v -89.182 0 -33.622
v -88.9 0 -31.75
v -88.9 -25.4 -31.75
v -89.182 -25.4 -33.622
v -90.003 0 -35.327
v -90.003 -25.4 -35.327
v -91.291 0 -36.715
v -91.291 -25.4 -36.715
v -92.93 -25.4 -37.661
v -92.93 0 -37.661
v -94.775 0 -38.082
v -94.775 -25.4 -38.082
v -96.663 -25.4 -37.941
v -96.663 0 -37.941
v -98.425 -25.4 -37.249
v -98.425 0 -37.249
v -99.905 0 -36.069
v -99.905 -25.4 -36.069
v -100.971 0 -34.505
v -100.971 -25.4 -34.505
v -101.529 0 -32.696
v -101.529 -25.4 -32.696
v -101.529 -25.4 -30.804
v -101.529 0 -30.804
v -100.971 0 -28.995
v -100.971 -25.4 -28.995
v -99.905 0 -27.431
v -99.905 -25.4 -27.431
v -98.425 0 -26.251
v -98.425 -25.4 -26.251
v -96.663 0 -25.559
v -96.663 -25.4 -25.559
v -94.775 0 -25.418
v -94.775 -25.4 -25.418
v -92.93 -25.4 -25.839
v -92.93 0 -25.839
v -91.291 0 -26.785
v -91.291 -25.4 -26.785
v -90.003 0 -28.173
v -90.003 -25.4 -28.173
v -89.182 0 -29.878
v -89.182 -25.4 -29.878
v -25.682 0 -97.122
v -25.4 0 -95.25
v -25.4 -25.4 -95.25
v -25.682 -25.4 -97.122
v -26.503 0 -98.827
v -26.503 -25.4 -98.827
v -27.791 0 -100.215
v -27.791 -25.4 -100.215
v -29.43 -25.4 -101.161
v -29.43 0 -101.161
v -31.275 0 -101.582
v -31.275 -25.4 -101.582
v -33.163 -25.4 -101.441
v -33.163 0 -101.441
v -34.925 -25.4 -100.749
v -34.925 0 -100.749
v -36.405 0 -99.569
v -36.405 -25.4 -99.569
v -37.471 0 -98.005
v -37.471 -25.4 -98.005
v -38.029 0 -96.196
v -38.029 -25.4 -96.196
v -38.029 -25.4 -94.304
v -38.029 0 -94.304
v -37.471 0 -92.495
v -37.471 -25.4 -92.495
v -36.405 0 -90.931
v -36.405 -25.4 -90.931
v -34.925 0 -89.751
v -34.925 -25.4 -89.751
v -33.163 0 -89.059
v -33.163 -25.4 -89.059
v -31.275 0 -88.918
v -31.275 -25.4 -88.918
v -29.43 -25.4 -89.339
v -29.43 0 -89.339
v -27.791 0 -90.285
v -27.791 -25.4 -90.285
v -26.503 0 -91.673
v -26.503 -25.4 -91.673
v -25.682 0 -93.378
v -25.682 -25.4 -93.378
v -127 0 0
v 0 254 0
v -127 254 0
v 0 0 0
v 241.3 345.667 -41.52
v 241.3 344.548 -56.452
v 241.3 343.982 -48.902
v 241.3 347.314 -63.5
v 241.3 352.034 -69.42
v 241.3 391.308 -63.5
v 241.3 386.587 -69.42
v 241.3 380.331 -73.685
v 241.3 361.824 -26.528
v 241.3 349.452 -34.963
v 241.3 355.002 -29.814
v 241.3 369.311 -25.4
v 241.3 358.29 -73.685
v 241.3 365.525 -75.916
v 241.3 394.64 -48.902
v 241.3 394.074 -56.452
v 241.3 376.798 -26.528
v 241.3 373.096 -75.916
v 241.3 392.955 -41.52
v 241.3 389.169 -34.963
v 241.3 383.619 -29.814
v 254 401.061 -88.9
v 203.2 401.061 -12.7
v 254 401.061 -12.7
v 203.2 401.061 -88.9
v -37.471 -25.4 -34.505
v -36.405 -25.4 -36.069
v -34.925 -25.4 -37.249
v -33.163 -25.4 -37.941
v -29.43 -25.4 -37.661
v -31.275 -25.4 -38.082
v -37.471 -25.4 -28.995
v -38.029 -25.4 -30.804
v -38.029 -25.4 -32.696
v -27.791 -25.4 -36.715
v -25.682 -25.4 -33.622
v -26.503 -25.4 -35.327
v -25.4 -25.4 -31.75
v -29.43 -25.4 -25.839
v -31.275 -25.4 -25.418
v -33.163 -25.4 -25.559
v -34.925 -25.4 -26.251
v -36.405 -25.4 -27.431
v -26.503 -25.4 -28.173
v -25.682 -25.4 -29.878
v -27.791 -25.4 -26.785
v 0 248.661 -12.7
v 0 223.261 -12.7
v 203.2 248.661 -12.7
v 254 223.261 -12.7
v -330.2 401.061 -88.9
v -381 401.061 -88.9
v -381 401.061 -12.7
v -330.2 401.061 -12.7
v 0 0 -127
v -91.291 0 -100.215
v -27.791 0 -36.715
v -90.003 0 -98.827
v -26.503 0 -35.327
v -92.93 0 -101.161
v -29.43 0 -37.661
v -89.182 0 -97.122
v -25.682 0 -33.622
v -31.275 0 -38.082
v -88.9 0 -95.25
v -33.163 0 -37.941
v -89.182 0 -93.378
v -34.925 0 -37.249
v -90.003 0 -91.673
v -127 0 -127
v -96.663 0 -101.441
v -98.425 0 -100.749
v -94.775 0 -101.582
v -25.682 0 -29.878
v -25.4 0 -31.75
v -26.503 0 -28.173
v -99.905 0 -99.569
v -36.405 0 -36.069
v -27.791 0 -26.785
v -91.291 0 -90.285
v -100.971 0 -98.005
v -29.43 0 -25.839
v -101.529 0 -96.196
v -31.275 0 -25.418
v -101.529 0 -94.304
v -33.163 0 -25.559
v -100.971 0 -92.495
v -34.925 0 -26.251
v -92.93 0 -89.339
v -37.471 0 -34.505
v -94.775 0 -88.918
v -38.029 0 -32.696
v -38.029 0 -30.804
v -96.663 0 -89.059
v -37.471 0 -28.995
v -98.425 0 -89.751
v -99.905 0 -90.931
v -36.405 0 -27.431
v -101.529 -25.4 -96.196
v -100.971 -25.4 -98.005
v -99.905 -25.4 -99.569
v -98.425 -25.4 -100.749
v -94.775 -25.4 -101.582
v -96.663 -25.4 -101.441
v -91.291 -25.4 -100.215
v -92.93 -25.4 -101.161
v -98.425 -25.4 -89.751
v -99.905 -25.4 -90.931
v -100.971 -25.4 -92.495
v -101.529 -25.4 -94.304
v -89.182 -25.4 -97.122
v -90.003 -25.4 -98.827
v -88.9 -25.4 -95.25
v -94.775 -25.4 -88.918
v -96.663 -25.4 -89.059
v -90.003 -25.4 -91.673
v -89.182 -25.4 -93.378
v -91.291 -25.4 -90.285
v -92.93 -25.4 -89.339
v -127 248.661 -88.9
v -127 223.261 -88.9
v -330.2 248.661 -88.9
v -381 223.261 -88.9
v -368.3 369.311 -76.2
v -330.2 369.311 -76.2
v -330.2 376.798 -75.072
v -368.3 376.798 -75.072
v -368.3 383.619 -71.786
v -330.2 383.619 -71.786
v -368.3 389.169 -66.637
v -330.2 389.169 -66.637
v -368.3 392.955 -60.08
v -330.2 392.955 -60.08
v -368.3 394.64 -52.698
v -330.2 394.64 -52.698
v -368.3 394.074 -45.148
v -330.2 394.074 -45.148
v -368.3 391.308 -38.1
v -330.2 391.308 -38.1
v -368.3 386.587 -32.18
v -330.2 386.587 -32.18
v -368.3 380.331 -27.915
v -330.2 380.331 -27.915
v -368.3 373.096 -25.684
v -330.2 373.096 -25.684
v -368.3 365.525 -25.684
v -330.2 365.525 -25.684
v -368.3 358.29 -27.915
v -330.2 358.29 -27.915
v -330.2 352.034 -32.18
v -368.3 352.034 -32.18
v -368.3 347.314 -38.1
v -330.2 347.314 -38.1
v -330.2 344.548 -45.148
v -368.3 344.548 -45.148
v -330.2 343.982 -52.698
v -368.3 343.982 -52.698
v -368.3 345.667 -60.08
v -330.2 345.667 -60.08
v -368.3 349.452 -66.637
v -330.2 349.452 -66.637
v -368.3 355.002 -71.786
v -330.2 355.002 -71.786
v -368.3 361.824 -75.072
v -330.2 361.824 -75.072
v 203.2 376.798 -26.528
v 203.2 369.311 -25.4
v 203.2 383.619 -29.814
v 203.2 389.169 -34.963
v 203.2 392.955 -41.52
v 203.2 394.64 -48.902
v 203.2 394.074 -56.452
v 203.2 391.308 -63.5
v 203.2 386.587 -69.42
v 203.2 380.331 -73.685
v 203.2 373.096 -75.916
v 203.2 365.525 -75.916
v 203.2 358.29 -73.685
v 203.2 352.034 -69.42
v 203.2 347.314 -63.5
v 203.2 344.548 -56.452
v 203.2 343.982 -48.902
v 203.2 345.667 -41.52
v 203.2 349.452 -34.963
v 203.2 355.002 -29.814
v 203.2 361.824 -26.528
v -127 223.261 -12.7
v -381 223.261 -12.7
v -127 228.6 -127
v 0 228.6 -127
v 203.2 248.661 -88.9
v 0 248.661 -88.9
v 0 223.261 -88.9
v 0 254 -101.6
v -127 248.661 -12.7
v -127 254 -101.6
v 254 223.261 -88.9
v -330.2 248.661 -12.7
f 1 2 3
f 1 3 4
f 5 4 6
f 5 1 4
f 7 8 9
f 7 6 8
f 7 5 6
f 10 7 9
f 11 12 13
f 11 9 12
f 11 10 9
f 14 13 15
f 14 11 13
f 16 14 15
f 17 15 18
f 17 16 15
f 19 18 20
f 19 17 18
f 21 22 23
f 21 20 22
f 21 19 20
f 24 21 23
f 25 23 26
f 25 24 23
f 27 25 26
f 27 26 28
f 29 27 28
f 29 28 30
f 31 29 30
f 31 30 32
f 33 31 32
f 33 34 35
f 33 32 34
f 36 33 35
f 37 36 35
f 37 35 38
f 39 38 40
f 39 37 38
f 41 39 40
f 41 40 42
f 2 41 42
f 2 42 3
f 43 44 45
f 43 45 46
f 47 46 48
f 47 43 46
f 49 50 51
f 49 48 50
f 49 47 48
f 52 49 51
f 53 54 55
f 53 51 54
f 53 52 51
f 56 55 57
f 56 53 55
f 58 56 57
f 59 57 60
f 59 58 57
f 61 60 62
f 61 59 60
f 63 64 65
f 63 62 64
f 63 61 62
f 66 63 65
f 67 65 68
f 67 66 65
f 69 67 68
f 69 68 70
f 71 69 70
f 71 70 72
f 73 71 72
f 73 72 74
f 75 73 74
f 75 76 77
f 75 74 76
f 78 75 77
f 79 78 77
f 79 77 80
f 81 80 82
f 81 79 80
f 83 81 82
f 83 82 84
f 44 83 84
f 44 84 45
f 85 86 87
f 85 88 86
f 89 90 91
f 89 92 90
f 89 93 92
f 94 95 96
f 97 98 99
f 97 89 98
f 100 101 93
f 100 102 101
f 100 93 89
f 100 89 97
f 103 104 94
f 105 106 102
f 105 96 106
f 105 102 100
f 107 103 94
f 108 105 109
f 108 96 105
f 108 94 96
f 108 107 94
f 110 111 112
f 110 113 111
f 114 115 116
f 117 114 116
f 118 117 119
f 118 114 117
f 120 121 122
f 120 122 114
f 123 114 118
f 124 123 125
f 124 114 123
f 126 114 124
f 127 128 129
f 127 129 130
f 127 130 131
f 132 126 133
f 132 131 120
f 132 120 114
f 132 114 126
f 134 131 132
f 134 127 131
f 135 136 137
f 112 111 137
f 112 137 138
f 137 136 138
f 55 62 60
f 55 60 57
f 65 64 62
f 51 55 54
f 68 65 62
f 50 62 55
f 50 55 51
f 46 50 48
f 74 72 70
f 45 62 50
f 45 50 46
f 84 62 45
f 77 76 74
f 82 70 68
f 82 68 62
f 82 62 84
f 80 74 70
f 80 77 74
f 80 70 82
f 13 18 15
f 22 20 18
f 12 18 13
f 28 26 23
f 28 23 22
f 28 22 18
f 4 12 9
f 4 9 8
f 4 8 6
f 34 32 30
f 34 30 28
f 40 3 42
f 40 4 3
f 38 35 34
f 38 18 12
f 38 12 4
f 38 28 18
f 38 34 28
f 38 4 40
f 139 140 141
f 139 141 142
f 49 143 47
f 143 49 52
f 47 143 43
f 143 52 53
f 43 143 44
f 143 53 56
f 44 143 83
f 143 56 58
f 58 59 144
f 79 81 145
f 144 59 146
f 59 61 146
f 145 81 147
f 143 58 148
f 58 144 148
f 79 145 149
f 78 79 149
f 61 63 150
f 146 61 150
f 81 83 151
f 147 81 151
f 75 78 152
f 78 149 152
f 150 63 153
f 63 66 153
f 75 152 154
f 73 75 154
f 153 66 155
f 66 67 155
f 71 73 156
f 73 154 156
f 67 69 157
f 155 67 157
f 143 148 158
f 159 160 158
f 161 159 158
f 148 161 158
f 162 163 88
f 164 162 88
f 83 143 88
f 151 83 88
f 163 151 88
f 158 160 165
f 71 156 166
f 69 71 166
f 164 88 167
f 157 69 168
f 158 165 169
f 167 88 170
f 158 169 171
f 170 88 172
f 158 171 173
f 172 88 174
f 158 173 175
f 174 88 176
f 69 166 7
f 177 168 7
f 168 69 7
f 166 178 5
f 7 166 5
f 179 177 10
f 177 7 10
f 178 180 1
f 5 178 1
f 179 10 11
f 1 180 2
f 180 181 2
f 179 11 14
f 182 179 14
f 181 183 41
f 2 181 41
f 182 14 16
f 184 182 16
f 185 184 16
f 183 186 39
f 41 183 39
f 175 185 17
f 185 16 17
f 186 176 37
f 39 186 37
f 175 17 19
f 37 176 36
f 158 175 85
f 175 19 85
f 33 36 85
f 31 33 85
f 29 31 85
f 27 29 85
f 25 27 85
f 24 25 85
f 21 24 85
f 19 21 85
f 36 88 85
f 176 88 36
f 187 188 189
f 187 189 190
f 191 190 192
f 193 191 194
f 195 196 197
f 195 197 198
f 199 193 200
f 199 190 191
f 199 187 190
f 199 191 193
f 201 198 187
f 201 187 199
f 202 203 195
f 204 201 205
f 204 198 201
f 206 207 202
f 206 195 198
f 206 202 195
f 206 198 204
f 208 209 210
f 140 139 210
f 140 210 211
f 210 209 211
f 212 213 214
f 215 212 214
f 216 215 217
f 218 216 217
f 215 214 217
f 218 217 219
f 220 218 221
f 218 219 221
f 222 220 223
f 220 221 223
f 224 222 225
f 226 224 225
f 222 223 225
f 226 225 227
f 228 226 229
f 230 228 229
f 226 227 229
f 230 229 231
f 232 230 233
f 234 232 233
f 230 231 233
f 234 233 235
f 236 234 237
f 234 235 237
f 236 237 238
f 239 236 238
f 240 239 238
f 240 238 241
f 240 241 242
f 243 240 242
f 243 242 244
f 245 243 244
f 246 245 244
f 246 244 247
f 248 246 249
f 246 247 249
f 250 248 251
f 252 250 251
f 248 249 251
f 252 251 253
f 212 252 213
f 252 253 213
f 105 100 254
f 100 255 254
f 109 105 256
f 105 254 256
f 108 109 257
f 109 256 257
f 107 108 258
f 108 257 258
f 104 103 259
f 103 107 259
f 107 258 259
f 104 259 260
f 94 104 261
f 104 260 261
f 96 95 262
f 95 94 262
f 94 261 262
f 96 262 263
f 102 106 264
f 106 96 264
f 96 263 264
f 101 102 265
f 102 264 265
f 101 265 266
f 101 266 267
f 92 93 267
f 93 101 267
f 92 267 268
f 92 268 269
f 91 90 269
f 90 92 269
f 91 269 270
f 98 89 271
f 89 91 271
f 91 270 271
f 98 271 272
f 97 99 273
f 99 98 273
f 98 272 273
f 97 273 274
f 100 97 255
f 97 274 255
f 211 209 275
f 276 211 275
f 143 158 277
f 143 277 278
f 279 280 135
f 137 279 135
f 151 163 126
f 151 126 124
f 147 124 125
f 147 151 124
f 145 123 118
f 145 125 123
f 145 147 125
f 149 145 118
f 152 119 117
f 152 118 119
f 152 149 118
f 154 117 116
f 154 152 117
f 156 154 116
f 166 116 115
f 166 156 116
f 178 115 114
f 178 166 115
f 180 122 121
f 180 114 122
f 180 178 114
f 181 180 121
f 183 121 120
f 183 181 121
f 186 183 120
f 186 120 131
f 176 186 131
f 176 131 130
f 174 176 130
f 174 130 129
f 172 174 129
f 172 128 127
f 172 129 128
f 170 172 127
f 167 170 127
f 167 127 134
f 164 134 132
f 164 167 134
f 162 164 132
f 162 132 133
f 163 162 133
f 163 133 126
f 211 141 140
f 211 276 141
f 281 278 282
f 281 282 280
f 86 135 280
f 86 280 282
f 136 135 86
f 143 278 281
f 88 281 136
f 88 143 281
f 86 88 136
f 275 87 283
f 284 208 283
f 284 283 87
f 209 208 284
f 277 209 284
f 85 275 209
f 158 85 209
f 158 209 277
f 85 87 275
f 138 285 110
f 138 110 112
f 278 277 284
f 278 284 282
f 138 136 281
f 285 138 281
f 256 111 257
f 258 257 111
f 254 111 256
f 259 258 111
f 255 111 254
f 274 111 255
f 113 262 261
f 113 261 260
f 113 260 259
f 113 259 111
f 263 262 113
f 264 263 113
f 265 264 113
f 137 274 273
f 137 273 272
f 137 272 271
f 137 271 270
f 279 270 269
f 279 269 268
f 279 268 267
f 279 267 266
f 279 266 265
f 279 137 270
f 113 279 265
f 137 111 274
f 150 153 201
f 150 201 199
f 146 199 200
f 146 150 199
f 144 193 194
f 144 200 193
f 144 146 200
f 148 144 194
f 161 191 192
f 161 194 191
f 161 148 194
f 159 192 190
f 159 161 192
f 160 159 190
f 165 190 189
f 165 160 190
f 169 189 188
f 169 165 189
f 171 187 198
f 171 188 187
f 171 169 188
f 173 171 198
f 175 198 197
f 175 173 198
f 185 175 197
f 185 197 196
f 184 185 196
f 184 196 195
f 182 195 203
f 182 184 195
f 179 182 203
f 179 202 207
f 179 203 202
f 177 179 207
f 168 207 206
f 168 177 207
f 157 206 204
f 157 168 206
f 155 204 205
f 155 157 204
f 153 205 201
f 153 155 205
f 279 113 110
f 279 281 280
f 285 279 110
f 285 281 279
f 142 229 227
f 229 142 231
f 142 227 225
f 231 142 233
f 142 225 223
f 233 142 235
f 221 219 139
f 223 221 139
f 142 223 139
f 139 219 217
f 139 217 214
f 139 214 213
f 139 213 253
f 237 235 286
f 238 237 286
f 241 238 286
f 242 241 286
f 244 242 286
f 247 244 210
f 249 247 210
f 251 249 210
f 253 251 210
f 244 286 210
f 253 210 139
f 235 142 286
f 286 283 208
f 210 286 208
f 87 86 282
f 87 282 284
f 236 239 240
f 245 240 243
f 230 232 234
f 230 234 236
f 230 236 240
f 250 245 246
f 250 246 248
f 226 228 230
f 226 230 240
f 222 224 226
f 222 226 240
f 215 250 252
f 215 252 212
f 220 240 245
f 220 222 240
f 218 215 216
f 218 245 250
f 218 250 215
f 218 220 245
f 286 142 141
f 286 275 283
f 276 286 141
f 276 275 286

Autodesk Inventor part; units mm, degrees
ref_plane "YZ Plane" through (0, 0, 0) normal (1, 0, 0) x (0, 1, 0)
ref_plane "XZ Plane" through (0, 0, 0) normal (0, 1, 0) x (-1, 0, 0)
ref_plane "XY Plane" through (0, 0, 0) normal (0, 0, 1) x (1, 0, 0)
sketch "Sketch1" plane through (0, 0, 0) normal (0, 1, 0) x (-1, 0, 0)
  line L0 (0, 0) -> (127, 0)
  line L1 (127, 0) -> (127, -127)
  line L2 (127, -127) -> (0, -127)
  line L3 (0, -127) -> (0, 0)
  dimension "d0" = 127
  dimension "d1" = 127
extrude "Extrusion1" add sketch "Sketch1" along normal blind 254
sketch "Sketch3" plane through (0, 0, 0) normal (0, -1, 0) x (1, 0, 0)
  line L0 (0, -127) -> (-127, -127) projected
  line L1 (-127, -127) -> (-127, 0) projected
  line L2 (0, 0) -> (0, -127) projected
  line L3 (-127, 0) -> (0, 0) projected
  circle A0 centre (-31.75, -31.75) radius 6.35
  circle A1 centre (-95.25, -31.75) radius 6.35
  circle A2 centre (-95.25, -95.25) radius 6.35
  circle A3 centre (-31.75, -95.25) radius 6.35
  dimension "d5" = 12.7
  dimension "d6" = 12.7
  dimension "d7" = 12.7
  dimension "d8" = 12.7
extrude "Extrusion2" add sketch "Sketch3" along normal blind 25.4 contours A0 | A1 | A2 | A3
thread "Thread1" size "1/2-13 UNC" class "2A" standard "ANSI Unified Screw Threads" full length
thread "Thread2" size "1/2-13 UNC" class "2A" standard "ANSI Unified Screw Threads" full length
thread "Thread3" size "1/2-13 UNC" class "2A" standard "ANSI Unified Screw Threads" full length
thread "Thread4" size "1/2-13 UNC" class "2A" standard "ANSI Unified Screw Threads" full length
chamfer "Chamfer1" distance 25.4 angle 45 1 edges at (-63.5, 254, -127)
sketch "Sketch5" plane through (0, 0, 0) normal (1, 0, 0) x (0, 0, -1)
  line L0 (127, 0) -> (127, 228.6) projected
  line L1 (101.6, 254) -> (0, 254) projected
  line L2 (12.7, 223.2608) -> (88.9, 223.2608)
  line L3 (88.9, 223.2608) -> (88.9, 248.6608)
  line L4 (88.9, 248.6608) -> (12.7, 248.6608)
  line L5 (12.7, 248.6608) -> (12.7, 223.2608)
  line L6 (12.7, 223.2608) -> (88.9, 248.6608) construction
  line L7 (88.9, 223.2608) -> (12.7, 248.6608) construction
  point P0 (0, 0)
  point P1 (50.8, 235.9608)
  dimension "d22" = 76.2
  dimension "d23" = 25.4
extrude "Extrusion3" add sketch "Sketch5" along normal blind 254
sketch "Sketch6" plane through (0, 248.6608, -12.7) normal (0, 1, 0) x (1, 0, 0)
  line L0 (0, 0) -> (254, 0) projected
  line L1 (254, 0) -> (203.2, 0)
  line L2 (203.2, 0) -> (203.2, 76.2)
  line L3 (203.2, 76.2) -> (254, 76.2)
  line L4 (254, 76.2) -> (254, 0)
  point P0 (0, -12.7)
  dimension "d26" = 50.8
  dimension "d27" = 76.2
extrude "Extrusion4" add sketch "Sketch6" along normal blind 152.4
sketch "Sketch7" plane through (203.2, 248.6608, -88.9) normal (-1, 0, 0) x (0, 0, 1)
  line L0 (0, 152.4) -> (76.2, 152.4) projected
  line L1 (38.1, 152.4) -> (38.1, 120.65)
  circle A0 centre (38.1, 120.65) radius 25.4
  point P0 (88.9, -248.6608)
  dimension "d30" = 31.75
  dimension "d31" = 50.8
extrude "Extrusion5" cut sketch "Sketch7" against normal blind 38.1
sketch "Sketch8" plane through (-127, 0, -127) normal (-1, 0, 0) x (0, 0, 1)
  line L0 (114.3, 223.2608) -> (114.3, 248.6608) projected
  line L1 (114.3, 248.6608) -> (38.1, 248.6608) projected
  line L2 (38.1, 223.2608) -> (114.3, 223.2608) projected
  line L3 (114.3, 223.2608) -> (114.3, 248.6608) projected
  line L4 (114.3, 248.6608) -> (38.1, 248.6608) projected
  line L5 (38.1, 248.6608) -> (38.1, 223.2608) projected
  line L6 (38.1, 223.2608) -> (114.3, 223.2608) projected
  line L7 (25.4, 254) -> (0, 228.6) projected
  line L8 (127, 254) -> (25.4, 254) projected
  line L9 (127, 0) -> (127, 254) projected
  line L10 (0, 0) -> (127, 0) projected
  line L11 (0, 0) -> (0, 228.6) projected
extrude "Extrusion6" add sketch "Sketch8" along normal blind 254 contours L2 L5 L1 L0
sketch "Sketch9" plane through (-127, 248.6608, -12.7) normal (0, 1, 0) x (1, 0, 0)
  line L0 (0, 76.2) -> (0, 0) projected
  line L1 (0, 76.2) -> (-254, 76.2) projected
  line L2 (-254, 0) -> (-254, 76.2) projected
  line L3 (0, 0) -> (-254, 0) projected
  line L4 (-254, 76.2) -> (-254, 0) projected
  line L5 (-254, 0) -> (-203.2, 0)
  line L6 (-203.2, 0) -> (-203.2, 76.2)
  line L7 (-203.2, 76.2) -> (-254, 76.2)
  line L8 (-254, 76.2) -> (-254, 0)
  point P0 (127, -12.7)
  dimension "d36" = 50.8
  dimension "d37" = 76.2
extrude "Extrusion7" add sketch "Sketch9" along normal blind 152.4 contours L6 L3 L2 L1
sketch "Sketch10" plane through (-330.2, 248.6608, -12.7) normal (1, 0, 0) x (0, 0, -1)
  circle A0 centre (38.1, 120.65) radius 25.4 projected
  circle A1 centre (38.1, 120.65) radius 25.4 projected
  point P0 (-12.7, -248.6608)
extrude "Extrusion8" cut sketch "Sketch10" against normal blind 38.1
properties part number "TubePostV1"
